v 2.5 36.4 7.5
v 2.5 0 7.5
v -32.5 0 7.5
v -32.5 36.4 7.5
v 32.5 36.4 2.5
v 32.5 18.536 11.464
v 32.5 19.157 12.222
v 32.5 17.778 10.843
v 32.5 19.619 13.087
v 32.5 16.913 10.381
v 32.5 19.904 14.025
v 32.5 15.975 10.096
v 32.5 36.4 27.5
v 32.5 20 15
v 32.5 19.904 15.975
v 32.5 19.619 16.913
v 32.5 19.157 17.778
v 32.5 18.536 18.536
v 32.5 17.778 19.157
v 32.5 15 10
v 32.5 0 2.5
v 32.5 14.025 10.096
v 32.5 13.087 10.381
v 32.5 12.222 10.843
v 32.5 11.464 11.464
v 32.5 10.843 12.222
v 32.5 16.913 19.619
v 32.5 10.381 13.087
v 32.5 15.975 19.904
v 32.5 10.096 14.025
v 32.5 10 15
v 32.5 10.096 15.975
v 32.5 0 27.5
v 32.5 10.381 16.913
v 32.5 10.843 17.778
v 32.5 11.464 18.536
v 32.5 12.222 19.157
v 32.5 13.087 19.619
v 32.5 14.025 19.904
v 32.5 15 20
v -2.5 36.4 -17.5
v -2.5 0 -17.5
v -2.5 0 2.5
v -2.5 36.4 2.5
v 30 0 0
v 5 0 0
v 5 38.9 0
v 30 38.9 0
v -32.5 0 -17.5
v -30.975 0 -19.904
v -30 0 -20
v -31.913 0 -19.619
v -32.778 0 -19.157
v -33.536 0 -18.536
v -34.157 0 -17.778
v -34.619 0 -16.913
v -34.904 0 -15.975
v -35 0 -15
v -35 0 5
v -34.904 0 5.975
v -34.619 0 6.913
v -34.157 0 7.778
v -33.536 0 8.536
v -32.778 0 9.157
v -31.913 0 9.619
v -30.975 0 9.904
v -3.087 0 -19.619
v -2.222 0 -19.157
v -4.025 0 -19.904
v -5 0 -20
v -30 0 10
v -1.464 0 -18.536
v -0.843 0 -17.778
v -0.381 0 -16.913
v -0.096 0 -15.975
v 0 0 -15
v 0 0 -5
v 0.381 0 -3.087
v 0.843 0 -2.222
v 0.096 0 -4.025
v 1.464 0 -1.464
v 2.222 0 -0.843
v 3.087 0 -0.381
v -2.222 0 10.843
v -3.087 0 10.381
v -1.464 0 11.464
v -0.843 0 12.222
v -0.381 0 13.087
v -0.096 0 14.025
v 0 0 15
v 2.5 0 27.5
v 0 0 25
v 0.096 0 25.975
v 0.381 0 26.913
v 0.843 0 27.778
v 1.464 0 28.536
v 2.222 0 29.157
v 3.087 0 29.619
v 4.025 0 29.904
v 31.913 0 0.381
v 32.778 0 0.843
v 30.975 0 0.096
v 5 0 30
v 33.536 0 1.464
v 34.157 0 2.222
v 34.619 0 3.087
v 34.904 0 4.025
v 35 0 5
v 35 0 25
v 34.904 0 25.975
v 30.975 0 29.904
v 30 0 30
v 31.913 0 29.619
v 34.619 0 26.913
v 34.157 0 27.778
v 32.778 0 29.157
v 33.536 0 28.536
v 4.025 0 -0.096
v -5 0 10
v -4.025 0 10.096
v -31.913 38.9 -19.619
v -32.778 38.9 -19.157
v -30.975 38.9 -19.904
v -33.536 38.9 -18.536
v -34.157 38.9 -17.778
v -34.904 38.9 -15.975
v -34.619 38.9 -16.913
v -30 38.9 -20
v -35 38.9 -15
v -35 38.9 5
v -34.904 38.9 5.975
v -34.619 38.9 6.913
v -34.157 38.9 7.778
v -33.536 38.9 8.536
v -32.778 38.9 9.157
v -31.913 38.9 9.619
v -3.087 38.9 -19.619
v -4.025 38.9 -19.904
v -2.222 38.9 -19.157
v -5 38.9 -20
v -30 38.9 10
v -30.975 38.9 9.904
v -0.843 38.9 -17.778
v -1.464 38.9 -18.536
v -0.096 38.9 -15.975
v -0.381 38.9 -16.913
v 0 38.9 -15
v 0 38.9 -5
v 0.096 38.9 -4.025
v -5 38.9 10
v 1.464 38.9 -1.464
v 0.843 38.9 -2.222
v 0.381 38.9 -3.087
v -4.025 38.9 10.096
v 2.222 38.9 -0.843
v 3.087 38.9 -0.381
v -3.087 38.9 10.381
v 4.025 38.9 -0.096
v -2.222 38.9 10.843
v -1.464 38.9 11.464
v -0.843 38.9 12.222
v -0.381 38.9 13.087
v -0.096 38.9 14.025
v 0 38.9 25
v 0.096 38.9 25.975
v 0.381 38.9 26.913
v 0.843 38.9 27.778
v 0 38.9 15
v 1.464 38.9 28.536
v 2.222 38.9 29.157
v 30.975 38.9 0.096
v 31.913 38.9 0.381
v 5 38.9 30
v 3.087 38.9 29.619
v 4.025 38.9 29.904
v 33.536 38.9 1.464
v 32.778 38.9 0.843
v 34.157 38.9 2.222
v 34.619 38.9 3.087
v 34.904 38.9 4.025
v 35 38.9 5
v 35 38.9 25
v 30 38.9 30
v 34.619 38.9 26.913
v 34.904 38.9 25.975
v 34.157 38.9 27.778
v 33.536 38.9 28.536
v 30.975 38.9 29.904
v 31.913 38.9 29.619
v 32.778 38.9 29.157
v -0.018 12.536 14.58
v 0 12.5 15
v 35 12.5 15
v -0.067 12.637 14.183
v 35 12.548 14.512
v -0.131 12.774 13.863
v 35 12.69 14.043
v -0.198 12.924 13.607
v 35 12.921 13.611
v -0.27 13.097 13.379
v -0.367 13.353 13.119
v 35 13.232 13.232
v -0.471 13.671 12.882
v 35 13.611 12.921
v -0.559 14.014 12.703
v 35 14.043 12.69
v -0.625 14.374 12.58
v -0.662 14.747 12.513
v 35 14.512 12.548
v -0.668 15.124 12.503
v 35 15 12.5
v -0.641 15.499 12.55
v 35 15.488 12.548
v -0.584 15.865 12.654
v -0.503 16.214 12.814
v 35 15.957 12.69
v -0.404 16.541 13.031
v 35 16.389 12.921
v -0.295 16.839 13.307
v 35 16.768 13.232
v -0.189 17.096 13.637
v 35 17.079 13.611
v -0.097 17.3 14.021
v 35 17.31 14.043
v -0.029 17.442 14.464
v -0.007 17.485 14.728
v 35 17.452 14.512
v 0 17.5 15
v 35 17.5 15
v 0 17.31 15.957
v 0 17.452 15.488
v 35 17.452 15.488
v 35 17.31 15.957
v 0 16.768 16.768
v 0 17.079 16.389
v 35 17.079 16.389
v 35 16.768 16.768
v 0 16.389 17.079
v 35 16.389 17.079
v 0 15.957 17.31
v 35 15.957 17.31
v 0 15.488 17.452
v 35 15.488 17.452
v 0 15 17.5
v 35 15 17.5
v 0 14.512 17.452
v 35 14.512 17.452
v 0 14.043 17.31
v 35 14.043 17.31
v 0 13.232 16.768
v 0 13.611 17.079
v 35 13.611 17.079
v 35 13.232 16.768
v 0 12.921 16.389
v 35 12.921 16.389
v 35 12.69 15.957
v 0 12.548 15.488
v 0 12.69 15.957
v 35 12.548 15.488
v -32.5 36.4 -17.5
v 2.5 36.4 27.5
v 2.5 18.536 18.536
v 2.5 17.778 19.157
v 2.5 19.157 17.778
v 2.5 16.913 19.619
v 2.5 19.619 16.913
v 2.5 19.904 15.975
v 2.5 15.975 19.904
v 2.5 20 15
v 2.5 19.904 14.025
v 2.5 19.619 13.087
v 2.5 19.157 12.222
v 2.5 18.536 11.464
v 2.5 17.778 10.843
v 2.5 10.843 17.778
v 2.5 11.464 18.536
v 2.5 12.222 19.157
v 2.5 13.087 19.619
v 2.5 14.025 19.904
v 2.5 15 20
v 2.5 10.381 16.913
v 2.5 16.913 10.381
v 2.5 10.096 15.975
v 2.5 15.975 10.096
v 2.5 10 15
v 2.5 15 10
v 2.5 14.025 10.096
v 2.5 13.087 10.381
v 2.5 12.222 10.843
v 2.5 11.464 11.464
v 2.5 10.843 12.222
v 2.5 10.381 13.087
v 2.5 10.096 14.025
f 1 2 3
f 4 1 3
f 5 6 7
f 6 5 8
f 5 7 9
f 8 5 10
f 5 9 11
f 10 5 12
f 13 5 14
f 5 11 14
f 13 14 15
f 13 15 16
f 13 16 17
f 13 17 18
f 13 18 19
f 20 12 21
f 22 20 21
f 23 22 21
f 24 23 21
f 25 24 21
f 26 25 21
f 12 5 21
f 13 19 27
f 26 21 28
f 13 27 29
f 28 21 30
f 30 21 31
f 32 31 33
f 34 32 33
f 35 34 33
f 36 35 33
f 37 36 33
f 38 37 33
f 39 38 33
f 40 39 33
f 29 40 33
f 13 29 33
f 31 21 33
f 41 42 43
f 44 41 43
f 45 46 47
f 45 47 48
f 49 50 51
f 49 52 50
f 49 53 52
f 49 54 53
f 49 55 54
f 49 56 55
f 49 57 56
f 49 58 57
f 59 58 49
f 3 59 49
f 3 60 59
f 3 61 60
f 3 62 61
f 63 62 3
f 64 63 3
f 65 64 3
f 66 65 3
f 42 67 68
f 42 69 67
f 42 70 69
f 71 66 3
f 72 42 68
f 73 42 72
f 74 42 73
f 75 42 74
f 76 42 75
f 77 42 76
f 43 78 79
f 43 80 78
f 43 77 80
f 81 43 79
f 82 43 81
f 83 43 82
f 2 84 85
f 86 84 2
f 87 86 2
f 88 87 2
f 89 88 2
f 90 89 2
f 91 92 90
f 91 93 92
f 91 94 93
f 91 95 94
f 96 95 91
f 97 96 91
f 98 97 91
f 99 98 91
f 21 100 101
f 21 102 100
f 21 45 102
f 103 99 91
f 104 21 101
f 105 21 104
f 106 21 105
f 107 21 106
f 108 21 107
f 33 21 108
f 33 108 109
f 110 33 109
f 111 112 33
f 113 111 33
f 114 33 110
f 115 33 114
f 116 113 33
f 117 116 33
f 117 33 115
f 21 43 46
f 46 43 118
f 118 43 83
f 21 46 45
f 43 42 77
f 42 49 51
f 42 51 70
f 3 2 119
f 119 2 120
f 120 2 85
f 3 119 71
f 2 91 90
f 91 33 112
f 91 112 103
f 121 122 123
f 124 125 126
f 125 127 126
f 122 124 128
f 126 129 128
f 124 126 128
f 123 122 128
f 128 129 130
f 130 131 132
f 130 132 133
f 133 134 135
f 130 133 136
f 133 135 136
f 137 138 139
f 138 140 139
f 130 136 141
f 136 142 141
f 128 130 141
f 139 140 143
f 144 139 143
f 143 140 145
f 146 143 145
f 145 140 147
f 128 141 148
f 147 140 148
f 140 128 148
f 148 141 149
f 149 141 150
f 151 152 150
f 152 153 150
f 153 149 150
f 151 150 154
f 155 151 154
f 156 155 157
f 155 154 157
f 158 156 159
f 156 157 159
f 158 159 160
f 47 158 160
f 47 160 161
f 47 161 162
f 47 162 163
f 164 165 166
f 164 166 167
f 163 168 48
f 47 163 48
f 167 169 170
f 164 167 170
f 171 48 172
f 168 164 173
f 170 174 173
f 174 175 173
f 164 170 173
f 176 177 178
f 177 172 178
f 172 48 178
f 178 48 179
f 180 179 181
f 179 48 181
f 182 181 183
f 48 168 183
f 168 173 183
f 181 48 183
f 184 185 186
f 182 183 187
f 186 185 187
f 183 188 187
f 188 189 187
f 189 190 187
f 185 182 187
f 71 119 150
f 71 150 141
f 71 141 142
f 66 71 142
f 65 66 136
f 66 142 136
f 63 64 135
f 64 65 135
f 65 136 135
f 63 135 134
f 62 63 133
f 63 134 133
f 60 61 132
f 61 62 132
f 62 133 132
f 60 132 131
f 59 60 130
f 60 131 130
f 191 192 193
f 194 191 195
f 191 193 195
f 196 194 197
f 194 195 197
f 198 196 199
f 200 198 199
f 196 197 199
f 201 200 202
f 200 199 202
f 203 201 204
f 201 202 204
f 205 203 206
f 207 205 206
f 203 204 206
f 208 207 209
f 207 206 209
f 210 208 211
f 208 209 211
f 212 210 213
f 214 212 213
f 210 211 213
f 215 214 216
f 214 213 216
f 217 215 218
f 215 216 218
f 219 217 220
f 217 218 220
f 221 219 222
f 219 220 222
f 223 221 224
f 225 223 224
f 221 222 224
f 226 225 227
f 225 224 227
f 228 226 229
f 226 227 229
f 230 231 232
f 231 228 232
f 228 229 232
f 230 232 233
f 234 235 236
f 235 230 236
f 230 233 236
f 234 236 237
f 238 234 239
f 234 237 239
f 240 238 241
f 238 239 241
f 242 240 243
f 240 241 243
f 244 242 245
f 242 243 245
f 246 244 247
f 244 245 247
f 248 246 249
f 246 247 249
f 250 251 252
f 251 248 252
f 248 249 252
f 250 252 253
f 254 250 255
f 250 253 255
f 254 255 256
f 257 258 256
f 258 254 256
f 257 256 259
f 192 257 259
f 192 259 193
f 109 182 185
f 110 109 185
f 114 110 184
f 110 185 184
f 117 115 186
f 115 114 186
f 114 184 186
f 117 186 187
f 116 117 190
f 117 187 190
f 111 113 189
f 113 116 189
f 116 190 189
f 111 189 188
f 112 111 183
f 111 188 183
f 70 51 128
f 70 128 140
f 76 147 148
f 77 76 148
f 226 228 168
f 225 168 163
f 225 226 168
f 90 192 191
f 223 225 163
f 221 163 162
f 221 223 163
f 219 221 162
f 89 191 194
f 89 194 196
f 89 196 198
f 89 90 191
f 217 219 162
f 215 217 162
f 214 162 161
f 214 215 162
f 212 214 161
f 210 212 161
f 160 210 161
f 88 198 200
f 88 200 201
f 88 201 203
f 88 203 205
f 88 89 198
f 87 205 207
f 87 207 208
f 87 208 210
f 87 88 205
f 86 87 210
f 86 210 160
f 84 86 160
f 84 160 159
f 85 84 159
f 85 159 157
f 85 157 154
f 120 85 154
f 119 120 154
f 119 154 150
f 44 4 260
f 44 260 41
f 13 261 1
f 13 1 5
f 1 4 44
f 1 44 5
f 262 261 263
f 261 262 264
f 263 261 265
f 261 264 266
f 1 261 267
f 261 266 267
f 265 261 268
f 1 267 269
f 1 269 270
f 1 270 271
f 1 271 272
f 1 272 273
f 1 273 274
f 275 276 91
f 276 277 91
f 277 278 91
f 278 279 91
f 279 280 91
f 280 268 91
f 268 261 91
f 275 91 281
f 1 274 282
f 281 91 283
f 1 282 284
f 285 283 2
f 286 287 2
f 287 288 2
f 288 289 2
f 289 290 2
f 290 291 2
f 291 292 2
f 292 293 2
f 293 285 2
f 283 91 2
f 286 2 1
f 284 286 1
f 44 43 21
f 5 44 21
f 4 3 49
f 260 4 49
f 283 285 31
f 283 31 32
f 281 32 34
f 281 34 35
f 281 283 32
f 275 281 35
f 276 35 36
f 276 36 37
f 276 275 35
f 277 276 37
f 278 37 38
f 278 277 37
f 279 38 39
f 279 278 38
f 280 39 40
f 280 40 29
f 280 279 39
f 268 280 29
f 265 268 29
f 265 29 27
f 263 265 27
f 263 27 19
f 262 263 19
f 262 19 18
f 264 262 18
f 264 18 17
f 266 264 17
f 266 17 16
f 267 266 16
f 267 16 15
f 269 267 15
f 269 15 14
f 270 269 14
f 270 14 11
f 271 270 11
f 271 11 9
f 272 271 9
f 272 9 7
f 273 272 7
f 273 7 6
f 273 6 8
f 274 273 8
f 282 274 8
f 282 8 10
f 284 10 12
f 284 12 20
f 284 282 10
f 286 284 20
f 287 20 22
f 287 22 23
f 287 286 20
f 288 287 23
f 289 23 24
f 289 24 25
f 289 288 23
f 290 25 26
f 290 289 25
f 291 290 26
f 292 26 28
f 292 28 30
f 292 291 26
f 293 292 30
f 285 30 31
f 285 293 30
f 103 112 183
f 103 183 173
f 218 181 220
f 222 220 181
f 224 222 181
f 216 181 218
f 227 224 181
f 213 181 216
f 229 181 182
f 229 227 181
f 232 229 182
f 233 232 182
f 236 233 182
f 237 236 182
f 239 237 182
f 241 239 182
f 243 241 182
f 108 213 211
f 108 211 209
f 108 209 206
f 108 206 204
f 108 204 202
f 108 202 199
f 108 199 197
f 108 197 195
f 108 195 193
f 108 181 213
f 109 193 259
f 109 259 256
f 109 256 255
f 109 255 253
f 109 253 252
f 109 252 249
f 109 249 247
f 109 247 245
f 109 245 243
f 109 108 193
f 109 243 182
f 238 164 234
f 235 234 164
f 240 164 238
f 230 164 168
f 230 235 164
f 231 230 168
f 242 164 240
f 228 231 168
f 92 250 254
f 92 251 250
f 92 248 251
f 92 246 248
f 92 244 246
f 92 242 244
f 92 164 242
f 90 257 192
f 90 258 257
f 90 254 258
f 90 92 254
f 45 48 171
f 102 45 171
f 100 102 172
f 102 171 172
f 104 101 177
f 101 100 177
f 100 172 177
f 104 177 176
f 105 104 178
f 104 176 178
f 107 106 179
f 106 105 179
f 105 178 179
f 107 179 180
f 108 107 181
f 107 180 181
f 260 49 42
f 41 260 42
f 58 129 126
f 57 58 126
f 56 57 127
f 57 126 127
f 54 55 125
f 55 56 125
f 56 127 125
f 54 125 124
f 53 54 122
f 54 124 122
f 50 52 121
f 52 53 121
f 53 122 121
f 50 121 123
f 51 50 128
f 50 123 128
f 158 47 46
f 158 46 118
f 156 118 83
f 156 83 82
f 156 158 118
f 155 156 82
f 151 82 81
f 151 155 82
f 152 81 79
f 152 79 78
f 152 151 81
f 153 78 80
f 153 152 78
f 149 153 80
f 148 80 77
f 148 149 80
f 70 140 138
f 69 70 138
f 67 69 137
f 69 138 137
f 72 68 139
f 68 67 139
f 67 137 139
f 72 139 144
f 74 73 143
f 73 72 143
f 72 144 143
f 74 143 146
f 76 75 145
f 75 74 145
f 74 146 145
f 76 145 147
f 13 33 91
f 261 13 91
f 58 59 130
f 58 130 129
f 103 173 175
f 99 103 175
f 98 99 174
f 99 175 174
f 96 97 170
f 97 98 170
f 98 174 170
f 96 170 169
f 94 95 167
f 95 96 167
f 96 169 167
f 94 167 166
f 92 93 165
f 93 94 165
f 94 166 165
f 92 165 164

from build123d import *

# Parameters (mm, degrees)
F1_DEPTH    = 38.9
F3_D        = 5
F4_T        = -2.5
F5_T1_DEPTH = 38.9
F5_T6_DEPTH = 38.9
F5_S7_R     = 2.5
F5_T8_DEPTH = 21
F5_T9_DEPTH = 63.9


# Not quite as in the source:
# - a fillet or chamfer that OpenCascade refuses, or shapes differently, is made with other operations: its cross-section is extruded or revolved along the edge and cut away or added


with BuildPart() as f1:
    # F0 (on Front) → F1 (new body)
    with BuildSketch(Plane.XZ):
        Polygon((0, 10), (0, 0), (35, 0), (35, 30), (0, 30), align=None)
        Polygon((0, -20), (0, 0), (0, 10), (-35, 10), (-35, -20), align=None)
    extrude(amount=-F1_DEPTH)

    # F3 (through all)
    with Locations(Plane.YZ.offset(35)):
        with Locations((15, 15)):
            Hole(F3_D / 2)

    # F4
    f4_openings = [f1.faces().sort_by_distance(p)[0] for p in [
        (0, 0, 5),
    ]]
    offset(amount=F4_T, openings=f4_openings, kind=Kind.INTERSECTION)

    # F5: fillet of radius 5 on 8 edges, made by hand

    # F5_s2 → F5_t1 (join)
    with BuildSketch(Plane.XZ.offset(-38.9)):
        with BuildLine():
            ThreePointArc((5, 0), (1.4644660941, -1.4644660941), (0, -5))
            Line((0, -5), (0, 0))
            Line((0, 0), (5, 0))
        make_face()
    extrude(amount=F5_T1_DEPTH)


with BuildPart() as f5_tool4:
    # F5_s5 → F5_t6 (new body)
    with BuildSketch(Plane.XZ):
        with BuildLine():
            ThreePointArc((0, 15), (-1.4644660941, 11.4644660941), (-5, 10))
            Line((-5, 10), (0, 10))
            Line((0, 10), (0, 15))
        make_face()
    extrude(amount=-F5_T6_DEPTH)

    # F5_s7 → F5_t8 (cut, symmetric)
    with BuildSketch(Plane.YZ.offset(-2.5)):
        with Locations((15, 15)):
            Circle(F5_S7_R)
    extrude(amount=F5_T8_DEPTH, both=True, mode=Mode.SUBTRACT)


with BuildPart() as f1_1:
    add(f1.part)

    # F5_t3: union F5_tool4
    add(f5_tool4.part)

    # F5_s10 → F5_t9 (cut)
    with BuildSketch(Plane.XZ.offset(-51.4)):
        with BuildLine():
            ThreePointArc((-30, 10), (-33.5355339059, 8.5355339059), (-35, 5))
            Line((-35, 5), (-35, 10))
            Line((-35, 10), (-30, 10))
        make_face()
        with BuildLine():
            ThreePointArc((-5, -20), (-1.4644660941, -18.5355339059), (0, -15))
            Line((0, -15), (0, -20))
            Line((0, -20), (-5, -20))
        make_face()
        with BuildLine():
            ThreePointArc((30, 0), (33.5355339059, 1.4644660941), (35, 5))
            Line((35, 5), (35, 0))
            Line((35, 0), (30, 0))
        make_face()
        with BuildLine():
            ThreePointArc((5, 30), (1.4644660941, 28.5355339059), (0, 25))
            Line((0, 25), (0, 30))
            Line((0, 30), (5, 30))
        make_face()
        with BuildLine():
            ThreePointArc((-35, -15), (-33.5355339059, -18.5355339059), (-30, -20))
            Line((-30, -20), (-35, -20))
            Line((-35, -20), (-35, -15))
        make_face()
        with BuildLine():
            ThreePointArc((35, 25), (33.5355339059, 28.5355339059), (30, 30))
            Line((30, 30), (35, 30))
            Line((35, 30), (35, 25))
        make_face()
    extrude(amount=F5_T9_DEPTH, mode=Mode.SUBTRACT)


solid = f1_1.part
